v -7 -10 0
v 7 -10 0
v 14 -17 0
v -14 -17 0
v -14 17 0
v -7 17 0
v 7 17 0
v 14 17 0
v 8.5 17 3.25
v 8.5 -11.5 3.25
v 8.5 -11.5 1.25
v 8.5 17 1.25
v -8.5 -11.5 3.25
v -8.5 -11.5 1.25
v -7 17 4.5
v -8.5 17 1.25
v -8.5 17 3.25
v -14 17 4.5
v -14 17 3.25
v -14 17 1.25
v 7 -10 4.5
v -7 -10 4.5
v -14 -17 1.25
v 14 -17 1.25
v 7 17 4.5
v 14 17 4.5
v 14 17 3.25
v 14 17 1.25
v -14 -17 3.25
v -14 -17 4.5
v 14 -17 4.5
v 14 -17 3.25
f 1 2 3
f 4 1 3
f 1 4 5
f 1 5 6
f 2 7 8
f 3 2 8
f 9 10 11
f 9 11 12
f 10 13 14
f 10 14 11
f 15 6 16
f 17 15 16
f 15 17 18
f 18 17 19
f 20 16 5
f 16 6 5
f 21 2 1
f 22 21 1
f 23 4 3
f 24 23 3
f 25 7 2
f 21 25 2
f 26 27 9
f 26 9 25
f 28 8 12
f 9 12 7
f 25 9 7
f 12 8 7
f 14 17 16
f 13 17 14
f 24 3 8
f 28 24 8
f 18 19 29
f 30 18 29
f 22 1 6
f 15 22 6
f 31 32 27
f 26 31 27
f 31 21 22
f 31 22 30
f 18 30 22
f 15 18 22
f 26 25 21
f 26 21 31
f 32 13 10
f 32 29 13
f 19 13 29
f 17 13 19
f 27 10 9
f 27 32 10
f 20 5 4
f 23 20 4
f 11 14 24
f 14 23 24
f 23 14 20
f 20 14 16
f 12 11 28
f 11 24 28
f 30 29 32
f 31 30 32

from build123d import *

# Parameters (mm, degrees)
F1_DEPTH = 4.5
F2_W     = 34
F2_H     = 2
F3_DEPTH = 5.5
F4_W     = 34
F4_H     = 2
F5_DEPTH = 5.5
F6_W     = 17
F6_H     = 2
F7_DEPTH = 5.5


with BuildPart() as f1:
    # F0 (on Top) → F1 (new body)
    with BuildSketch(Plane.XY):
        Polygon((-14, -17), (14, -17), (14, 17), (7, 17), (7, -10), (-7, -10), (-7, 17), (-14, 17), align=None)
    extrude(amount=F1_DEPTH)

    # F2 (on face) → F3 (cut)
    with BuildSketch(Plane(origin=(-14, 0, 0), x_dir=(0, -1, 0), z_dir=(-1, 0, 0))):
        with Locations((0, 2.25)):
            Rectangle(F2_W, F2_H)
    extrude(amount=-F3_DEPTH, mode=Mode.SUBTRACT)

    # F4 (on face) → F5 (cut)
    with BuildSketch(Plane.YZ.offset(14)):
        with Locations((0, 2.25)):
            Rectangle(F4_W, F4_H)
    extrude(amount=-F5_DEPTH, mode=Mode.SUBTRACT)

    # F6 (on face) → F7 (cut)
    with BuildSketch(Plane.XZ.offset(17)):
        with Locations((0, 2.25)):
            Rectangle(F6_W, F6_H)
    extrude(amount=-F7_DEPTH, mode=Mode.SUBTRACT)


solid = f1.part
